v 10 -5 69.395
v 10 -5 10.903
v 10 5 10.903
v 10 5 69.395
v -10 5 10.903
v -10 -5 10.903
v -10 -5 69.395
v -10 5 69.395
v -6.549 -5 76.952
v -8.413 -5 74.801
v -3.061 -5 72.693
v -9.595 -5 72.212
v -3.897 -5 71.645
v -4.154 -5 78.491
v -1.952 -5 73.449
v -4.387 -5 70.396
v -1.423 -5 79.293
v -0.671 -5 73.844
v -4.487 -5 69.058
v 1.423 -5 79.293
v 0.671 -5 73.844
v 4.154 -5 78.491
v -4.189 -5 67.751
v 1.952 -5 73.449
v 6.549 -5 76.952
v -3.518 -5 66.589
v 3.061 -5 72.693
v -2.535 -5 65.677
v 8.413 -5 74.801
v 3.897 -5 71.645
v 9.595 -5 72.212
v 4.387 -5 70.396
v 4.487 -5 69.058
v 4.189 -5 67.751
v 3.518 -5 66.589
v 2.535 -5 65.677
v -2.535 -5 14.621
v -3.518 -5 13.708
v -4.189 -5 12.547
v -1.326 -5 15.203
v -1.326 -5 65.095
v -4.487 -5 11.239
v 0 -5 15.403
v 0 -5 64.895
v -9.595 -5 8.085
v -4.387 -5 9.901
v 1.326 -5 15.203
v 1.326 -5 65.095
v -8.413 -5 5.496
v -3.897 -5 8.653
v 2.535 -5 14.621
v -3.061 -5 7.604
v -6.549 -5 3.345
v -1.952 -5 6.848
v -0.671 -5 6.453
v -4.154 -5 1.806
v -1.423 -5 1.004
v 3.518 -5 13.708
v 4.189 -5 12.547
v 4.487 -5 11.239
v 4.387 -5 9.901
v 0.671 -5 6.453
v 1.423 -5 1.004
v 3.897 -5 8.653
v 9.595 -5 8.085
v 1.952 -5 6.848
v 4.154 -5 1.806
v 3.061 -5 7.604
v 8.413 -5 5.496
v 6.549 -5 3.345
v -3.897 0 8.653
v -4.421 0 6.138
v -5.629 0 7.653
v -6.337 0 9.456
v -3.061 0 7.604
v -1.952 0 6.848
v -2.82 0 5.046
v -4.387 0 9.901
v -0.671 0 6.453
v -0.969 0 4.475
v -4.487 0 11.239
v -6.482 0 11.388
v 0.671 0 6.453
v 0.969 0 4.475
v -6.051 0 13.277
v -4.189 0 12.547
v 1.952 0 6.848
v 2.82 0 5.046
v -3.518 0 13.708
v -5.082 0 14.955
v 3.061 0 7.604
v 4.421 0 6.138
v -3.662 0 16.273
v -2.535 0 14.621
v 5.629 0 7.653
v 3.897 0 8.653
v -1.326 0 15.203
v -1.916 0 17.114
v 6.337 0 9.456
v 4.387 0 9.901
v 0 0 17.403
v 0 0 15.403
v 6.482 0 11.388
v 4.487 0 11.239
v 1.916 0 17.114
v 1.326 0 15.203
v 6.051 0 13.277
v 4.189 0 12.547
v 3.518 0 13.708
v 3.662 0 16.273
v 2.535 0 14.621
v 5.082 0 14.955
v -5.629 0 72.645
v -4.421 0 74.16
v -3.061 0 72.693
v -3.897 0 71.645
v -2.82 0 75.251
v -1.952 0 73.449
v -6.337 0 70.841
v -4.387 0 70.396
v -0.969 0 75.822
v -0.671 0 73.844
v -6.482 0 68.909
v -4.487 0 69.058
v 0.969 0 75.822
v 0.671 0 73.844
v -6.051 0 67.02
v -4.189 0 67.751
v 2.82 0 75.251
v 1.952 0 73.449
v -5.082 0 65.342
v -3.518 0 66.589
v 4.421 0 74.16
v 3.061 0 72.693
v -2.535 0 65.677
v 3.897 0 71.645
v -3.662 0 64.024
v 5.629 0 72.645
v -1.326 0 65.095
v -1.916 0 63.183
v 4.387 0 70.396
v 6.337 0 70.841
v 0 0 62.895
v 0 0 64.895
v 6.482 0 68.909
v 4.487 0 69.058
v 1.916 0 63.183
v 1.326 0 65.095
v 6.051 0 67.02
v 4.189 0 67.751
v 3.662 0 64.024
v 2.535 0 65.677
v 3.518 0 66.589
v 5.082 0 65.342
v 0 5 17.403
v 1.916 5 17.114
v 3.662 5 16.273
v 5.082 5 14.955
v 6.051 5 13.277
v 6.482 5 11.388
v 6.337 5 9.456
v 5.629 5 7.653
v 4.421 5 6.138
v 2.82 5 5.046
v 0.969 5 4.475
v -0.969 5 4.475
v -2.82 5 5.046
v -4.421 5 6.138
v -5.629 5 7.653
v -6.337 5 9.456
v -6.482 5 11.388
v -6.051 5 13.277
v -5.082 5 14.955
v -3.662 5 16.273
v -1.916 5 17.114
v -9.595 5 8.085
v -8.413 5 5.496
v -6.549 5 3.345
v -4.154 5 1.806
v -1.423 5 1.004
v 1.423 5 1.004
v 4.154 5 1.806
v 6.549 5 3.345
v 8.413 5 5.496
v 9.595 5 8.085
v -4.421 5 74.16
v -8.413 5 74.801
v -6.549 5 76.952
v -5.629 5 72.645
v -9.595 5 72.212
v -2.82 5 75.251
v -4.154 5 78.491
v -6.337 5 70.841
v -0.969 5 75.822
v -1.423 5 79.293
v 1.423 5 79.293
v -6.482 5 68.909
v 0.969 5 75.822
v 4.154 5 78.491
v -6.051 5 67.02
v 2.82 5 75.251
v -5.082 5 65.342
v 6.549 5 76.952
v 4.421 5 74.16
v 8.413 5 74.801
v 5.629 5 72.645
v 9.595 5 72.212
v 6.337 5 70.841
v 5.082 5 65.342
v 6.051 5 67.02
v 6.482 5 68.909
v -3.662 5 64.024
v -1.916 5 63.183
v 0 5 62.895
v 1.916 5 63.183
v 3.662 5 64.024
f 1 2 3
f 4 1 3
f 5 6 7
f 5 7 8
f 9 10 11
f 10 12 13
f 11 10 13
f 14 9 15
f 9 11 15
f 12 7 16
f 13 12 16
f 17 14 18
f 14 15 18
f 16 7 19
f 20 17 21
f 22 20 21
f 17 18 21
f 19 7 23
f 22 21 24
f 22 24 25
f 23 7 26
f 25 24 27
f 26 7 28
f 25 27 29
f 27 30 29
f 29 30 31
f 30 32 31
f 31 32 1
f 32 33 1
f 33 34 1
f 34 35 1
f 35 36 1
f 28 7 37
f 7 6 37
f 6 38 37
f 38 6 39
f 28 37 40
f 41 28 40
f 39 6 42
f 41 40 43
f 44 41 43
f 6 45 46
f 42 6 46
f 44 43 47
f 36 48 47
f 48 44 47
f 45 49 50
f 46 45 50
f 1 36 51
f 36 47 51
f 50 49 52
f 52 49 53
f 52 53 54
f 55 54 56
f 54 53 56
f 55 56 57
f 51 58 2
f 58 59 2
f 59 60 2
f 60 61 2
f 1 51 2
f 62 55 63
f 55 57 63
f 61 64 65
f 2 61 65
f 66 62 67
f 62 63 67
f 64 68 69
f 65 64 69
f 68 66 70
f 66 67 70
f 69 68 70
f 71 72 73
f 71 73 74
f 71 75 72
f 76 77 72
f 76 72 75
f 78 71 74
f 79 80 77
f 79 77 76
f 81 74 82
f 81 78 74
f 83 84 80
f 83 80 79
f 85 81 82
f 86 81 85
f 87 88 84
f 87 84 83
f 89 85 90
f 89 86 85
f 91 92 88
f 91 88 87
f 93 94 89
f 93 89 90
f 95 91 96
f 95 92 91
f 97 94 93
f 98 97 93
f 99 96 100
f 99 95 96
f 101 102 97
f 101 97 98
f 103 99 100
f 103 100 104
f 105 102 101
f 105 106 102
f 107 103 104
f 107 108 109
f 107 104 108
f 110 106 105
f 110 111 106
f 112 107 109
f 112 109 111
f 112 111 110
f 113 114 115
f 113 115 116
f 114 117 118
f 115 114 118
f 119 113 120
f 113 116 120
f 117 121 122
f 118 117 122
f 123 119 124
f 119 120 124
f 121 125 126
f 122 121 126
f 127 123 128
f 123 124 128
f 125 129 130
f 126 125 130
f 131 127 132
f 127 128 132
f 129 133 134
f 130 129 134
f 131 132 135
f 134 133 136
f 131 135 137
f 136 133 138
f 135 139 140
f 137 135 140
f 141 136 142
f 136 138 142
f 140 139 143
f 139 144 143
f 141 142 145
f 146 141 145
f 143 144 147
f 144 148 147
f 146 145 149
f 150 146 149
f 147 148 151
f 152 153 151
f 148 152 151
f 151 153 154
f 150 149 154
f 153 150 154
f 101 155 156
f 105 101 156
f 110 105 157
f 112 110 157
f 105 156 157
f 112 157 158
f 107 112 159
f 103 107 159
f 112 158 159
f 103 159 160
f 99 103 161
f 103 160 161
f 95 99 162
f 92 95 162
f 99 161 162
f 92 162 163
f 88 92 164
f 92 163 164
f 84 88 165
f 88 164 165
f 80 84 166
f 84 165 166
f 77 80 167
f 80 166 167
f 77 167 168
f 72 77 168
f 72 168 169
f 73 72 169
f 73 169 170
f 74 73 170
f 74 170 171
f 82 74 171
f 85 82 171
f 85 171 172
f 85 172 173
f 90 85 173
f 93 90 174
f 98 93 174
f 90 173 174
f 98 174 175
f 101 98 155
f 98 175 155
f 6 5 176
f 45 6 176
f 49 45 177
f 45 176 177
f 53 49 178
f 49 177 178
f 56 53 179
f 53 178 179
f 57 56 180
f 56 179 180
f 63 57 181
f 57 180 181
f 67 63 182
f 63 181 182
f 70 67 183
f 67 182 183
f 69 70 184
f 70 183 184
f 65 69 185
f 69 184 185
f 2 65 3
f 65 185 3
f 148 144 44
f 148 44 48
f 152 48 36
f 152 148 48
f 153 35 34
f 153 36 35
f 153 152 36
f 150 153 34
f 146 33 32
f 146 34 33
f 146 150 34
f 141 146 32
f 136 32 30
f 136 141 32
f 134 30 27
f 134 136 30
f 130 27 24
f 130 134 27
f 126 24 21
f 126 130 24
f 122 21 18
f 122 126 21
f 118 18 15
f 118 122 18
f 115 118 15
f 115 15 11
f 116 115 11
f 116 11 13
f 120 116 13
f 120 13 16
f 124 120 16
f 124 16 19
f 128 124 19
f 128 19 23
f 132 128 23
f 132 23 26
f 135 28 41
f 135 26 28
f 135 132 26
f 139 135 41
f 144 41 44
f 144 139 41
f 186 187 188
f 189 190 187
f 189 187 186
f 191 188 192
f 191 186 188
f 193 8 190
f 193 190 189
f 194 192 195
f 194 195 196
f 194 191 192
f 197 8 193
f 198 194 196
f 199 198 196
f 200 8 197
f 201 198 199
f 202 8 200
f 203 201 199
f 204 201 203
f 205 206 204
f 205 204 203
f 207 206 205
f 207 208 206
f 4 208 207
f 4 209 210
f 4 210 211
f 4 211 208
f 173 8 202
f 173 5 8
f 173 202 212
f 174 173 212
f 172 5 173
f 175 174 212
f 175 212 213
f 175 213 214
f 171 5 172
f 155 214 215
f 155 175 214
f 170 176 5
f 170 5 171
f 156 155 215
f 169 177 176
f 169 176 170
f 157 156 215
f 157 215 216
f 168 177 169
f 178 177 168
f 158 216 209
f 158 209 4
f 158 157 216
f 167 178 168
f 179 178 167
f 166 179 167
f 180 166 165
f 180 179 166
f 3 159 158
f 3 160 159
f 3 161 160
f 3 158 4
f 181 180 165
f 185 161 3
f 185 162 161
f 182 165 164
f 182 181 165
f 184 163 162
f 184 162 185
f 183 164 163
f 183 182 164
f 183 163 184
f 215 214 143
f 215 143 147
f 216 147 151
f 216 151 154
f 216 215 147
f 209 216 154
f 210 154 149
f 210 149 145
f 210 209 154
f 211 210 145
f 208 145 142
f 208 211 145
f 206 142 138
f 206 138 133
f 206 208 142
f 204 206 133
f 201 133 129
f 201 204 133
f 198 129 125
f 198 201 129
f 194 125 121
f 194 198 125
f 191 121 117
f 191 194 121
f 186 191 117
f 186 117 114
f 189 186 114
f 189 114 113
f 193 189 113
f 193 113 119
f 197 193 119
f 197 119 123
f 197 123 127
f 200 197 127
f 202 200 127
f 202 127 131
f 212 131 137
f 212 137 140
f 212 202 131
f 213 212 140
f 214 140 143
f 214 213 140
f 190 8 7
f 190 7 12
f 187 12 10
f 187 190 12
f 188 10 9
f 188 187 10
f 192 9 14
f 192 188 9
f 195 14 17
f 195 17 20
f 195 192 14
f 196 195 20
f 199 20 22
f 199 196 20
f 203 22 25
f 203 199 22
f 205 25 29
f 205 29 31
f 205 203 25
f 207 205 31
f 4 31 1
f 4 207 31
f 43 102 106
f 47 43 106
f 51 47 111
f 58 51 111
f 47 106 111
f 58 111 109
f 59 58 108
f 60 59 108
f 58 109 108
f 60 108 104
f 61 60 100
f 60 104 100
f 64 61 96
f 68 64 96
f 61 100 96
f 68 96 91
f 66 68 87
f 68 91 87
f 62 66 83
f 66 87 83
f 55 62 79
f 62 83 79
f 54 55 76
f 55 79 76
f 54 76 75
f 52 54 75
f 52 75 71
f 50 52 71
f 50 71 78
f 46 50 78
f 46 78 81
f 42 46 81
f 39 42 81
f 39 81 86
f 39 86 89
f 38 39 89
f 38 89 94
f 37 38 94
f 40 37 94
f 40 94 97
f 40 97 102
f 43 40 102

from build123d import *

# Parameters (mm, degrees)
SKETCH_1_W          = 20
SKETCH_1_H          = 10
EXTRUDE_1_DEPTH     = 80.297387422
SKETCH_2_R          = 6.5
CUT_EXTRUDE_1_DEPTH = 5
SKETCH_3_R          = 4.5
CUT_EXTRUDE_2_DEPTH = 20


with BuildPart() as part:
    # 스케치1 → 보스-돌출1 (new body)
    with BuildSketch(Plane.XY):
        Rectangle(SKETCH_1_W, SKETCH_1_H)
    extrude(amount=EXTRUDE_1_DEPTH)

    # 스케치2 → 컷-돌출1 (cut)
    with BuildSketch(Plane(origin=(0, 5, 0), x_dir=(1, 0, 0), z_dir=(0, 1, 0))):
        with Locations(Location((0, -10.902706153, 0), (0, 0, 270))):
            Circle(SKETCH_2_R)
    cut_extrude_1 = extrude(amount=-CUT_EXTRUDE_1_DEPTH, mode=Mode.SUBTRACT)

    # 스케치3 → 컷-돌출2 (cut)
    with BuildSketch(Plane(origin=(0, 5, 0), x_dir=(1, 0, 0), z_dir=(0, 1, 0))):
        with Locations(Location((0, -10.902706153, 0), (0, 0, 270))):
            Circle(SKETCH_3_R)
        with BuildLine():
            Line((-21.262122506, -10.902706153), (-10, -10.902706153))
            ThreePointArc((-10, -10.902706153), (0, -0.902706153), (10, -10.902706153))
            Line((10, -10.902706153), (21.262122506, -10.902706153))
            ThreePointArc((21.262122506, -10.902706153), (0, 10.359416353), (-21.262122506, -10.902706153))
        make_face()
    cut_extrude_2 = extrude(amount=-CUT_EXTRUDE_2_DEPTH, mode=Mode.SUBTRACT)

    # 대칭 복사1: 컷-돌출1, 컷-돌출2 across plane
    add(cut_extrude_1.mirror(Plane.XY.offset(40.148693711)), mode=Mode.SUBTRACT)
    add(cut_extrude_2.mirror(Plane.XY.offset(40.148693711)), mode=Mode.SUBTRACT)


solid = part.part
